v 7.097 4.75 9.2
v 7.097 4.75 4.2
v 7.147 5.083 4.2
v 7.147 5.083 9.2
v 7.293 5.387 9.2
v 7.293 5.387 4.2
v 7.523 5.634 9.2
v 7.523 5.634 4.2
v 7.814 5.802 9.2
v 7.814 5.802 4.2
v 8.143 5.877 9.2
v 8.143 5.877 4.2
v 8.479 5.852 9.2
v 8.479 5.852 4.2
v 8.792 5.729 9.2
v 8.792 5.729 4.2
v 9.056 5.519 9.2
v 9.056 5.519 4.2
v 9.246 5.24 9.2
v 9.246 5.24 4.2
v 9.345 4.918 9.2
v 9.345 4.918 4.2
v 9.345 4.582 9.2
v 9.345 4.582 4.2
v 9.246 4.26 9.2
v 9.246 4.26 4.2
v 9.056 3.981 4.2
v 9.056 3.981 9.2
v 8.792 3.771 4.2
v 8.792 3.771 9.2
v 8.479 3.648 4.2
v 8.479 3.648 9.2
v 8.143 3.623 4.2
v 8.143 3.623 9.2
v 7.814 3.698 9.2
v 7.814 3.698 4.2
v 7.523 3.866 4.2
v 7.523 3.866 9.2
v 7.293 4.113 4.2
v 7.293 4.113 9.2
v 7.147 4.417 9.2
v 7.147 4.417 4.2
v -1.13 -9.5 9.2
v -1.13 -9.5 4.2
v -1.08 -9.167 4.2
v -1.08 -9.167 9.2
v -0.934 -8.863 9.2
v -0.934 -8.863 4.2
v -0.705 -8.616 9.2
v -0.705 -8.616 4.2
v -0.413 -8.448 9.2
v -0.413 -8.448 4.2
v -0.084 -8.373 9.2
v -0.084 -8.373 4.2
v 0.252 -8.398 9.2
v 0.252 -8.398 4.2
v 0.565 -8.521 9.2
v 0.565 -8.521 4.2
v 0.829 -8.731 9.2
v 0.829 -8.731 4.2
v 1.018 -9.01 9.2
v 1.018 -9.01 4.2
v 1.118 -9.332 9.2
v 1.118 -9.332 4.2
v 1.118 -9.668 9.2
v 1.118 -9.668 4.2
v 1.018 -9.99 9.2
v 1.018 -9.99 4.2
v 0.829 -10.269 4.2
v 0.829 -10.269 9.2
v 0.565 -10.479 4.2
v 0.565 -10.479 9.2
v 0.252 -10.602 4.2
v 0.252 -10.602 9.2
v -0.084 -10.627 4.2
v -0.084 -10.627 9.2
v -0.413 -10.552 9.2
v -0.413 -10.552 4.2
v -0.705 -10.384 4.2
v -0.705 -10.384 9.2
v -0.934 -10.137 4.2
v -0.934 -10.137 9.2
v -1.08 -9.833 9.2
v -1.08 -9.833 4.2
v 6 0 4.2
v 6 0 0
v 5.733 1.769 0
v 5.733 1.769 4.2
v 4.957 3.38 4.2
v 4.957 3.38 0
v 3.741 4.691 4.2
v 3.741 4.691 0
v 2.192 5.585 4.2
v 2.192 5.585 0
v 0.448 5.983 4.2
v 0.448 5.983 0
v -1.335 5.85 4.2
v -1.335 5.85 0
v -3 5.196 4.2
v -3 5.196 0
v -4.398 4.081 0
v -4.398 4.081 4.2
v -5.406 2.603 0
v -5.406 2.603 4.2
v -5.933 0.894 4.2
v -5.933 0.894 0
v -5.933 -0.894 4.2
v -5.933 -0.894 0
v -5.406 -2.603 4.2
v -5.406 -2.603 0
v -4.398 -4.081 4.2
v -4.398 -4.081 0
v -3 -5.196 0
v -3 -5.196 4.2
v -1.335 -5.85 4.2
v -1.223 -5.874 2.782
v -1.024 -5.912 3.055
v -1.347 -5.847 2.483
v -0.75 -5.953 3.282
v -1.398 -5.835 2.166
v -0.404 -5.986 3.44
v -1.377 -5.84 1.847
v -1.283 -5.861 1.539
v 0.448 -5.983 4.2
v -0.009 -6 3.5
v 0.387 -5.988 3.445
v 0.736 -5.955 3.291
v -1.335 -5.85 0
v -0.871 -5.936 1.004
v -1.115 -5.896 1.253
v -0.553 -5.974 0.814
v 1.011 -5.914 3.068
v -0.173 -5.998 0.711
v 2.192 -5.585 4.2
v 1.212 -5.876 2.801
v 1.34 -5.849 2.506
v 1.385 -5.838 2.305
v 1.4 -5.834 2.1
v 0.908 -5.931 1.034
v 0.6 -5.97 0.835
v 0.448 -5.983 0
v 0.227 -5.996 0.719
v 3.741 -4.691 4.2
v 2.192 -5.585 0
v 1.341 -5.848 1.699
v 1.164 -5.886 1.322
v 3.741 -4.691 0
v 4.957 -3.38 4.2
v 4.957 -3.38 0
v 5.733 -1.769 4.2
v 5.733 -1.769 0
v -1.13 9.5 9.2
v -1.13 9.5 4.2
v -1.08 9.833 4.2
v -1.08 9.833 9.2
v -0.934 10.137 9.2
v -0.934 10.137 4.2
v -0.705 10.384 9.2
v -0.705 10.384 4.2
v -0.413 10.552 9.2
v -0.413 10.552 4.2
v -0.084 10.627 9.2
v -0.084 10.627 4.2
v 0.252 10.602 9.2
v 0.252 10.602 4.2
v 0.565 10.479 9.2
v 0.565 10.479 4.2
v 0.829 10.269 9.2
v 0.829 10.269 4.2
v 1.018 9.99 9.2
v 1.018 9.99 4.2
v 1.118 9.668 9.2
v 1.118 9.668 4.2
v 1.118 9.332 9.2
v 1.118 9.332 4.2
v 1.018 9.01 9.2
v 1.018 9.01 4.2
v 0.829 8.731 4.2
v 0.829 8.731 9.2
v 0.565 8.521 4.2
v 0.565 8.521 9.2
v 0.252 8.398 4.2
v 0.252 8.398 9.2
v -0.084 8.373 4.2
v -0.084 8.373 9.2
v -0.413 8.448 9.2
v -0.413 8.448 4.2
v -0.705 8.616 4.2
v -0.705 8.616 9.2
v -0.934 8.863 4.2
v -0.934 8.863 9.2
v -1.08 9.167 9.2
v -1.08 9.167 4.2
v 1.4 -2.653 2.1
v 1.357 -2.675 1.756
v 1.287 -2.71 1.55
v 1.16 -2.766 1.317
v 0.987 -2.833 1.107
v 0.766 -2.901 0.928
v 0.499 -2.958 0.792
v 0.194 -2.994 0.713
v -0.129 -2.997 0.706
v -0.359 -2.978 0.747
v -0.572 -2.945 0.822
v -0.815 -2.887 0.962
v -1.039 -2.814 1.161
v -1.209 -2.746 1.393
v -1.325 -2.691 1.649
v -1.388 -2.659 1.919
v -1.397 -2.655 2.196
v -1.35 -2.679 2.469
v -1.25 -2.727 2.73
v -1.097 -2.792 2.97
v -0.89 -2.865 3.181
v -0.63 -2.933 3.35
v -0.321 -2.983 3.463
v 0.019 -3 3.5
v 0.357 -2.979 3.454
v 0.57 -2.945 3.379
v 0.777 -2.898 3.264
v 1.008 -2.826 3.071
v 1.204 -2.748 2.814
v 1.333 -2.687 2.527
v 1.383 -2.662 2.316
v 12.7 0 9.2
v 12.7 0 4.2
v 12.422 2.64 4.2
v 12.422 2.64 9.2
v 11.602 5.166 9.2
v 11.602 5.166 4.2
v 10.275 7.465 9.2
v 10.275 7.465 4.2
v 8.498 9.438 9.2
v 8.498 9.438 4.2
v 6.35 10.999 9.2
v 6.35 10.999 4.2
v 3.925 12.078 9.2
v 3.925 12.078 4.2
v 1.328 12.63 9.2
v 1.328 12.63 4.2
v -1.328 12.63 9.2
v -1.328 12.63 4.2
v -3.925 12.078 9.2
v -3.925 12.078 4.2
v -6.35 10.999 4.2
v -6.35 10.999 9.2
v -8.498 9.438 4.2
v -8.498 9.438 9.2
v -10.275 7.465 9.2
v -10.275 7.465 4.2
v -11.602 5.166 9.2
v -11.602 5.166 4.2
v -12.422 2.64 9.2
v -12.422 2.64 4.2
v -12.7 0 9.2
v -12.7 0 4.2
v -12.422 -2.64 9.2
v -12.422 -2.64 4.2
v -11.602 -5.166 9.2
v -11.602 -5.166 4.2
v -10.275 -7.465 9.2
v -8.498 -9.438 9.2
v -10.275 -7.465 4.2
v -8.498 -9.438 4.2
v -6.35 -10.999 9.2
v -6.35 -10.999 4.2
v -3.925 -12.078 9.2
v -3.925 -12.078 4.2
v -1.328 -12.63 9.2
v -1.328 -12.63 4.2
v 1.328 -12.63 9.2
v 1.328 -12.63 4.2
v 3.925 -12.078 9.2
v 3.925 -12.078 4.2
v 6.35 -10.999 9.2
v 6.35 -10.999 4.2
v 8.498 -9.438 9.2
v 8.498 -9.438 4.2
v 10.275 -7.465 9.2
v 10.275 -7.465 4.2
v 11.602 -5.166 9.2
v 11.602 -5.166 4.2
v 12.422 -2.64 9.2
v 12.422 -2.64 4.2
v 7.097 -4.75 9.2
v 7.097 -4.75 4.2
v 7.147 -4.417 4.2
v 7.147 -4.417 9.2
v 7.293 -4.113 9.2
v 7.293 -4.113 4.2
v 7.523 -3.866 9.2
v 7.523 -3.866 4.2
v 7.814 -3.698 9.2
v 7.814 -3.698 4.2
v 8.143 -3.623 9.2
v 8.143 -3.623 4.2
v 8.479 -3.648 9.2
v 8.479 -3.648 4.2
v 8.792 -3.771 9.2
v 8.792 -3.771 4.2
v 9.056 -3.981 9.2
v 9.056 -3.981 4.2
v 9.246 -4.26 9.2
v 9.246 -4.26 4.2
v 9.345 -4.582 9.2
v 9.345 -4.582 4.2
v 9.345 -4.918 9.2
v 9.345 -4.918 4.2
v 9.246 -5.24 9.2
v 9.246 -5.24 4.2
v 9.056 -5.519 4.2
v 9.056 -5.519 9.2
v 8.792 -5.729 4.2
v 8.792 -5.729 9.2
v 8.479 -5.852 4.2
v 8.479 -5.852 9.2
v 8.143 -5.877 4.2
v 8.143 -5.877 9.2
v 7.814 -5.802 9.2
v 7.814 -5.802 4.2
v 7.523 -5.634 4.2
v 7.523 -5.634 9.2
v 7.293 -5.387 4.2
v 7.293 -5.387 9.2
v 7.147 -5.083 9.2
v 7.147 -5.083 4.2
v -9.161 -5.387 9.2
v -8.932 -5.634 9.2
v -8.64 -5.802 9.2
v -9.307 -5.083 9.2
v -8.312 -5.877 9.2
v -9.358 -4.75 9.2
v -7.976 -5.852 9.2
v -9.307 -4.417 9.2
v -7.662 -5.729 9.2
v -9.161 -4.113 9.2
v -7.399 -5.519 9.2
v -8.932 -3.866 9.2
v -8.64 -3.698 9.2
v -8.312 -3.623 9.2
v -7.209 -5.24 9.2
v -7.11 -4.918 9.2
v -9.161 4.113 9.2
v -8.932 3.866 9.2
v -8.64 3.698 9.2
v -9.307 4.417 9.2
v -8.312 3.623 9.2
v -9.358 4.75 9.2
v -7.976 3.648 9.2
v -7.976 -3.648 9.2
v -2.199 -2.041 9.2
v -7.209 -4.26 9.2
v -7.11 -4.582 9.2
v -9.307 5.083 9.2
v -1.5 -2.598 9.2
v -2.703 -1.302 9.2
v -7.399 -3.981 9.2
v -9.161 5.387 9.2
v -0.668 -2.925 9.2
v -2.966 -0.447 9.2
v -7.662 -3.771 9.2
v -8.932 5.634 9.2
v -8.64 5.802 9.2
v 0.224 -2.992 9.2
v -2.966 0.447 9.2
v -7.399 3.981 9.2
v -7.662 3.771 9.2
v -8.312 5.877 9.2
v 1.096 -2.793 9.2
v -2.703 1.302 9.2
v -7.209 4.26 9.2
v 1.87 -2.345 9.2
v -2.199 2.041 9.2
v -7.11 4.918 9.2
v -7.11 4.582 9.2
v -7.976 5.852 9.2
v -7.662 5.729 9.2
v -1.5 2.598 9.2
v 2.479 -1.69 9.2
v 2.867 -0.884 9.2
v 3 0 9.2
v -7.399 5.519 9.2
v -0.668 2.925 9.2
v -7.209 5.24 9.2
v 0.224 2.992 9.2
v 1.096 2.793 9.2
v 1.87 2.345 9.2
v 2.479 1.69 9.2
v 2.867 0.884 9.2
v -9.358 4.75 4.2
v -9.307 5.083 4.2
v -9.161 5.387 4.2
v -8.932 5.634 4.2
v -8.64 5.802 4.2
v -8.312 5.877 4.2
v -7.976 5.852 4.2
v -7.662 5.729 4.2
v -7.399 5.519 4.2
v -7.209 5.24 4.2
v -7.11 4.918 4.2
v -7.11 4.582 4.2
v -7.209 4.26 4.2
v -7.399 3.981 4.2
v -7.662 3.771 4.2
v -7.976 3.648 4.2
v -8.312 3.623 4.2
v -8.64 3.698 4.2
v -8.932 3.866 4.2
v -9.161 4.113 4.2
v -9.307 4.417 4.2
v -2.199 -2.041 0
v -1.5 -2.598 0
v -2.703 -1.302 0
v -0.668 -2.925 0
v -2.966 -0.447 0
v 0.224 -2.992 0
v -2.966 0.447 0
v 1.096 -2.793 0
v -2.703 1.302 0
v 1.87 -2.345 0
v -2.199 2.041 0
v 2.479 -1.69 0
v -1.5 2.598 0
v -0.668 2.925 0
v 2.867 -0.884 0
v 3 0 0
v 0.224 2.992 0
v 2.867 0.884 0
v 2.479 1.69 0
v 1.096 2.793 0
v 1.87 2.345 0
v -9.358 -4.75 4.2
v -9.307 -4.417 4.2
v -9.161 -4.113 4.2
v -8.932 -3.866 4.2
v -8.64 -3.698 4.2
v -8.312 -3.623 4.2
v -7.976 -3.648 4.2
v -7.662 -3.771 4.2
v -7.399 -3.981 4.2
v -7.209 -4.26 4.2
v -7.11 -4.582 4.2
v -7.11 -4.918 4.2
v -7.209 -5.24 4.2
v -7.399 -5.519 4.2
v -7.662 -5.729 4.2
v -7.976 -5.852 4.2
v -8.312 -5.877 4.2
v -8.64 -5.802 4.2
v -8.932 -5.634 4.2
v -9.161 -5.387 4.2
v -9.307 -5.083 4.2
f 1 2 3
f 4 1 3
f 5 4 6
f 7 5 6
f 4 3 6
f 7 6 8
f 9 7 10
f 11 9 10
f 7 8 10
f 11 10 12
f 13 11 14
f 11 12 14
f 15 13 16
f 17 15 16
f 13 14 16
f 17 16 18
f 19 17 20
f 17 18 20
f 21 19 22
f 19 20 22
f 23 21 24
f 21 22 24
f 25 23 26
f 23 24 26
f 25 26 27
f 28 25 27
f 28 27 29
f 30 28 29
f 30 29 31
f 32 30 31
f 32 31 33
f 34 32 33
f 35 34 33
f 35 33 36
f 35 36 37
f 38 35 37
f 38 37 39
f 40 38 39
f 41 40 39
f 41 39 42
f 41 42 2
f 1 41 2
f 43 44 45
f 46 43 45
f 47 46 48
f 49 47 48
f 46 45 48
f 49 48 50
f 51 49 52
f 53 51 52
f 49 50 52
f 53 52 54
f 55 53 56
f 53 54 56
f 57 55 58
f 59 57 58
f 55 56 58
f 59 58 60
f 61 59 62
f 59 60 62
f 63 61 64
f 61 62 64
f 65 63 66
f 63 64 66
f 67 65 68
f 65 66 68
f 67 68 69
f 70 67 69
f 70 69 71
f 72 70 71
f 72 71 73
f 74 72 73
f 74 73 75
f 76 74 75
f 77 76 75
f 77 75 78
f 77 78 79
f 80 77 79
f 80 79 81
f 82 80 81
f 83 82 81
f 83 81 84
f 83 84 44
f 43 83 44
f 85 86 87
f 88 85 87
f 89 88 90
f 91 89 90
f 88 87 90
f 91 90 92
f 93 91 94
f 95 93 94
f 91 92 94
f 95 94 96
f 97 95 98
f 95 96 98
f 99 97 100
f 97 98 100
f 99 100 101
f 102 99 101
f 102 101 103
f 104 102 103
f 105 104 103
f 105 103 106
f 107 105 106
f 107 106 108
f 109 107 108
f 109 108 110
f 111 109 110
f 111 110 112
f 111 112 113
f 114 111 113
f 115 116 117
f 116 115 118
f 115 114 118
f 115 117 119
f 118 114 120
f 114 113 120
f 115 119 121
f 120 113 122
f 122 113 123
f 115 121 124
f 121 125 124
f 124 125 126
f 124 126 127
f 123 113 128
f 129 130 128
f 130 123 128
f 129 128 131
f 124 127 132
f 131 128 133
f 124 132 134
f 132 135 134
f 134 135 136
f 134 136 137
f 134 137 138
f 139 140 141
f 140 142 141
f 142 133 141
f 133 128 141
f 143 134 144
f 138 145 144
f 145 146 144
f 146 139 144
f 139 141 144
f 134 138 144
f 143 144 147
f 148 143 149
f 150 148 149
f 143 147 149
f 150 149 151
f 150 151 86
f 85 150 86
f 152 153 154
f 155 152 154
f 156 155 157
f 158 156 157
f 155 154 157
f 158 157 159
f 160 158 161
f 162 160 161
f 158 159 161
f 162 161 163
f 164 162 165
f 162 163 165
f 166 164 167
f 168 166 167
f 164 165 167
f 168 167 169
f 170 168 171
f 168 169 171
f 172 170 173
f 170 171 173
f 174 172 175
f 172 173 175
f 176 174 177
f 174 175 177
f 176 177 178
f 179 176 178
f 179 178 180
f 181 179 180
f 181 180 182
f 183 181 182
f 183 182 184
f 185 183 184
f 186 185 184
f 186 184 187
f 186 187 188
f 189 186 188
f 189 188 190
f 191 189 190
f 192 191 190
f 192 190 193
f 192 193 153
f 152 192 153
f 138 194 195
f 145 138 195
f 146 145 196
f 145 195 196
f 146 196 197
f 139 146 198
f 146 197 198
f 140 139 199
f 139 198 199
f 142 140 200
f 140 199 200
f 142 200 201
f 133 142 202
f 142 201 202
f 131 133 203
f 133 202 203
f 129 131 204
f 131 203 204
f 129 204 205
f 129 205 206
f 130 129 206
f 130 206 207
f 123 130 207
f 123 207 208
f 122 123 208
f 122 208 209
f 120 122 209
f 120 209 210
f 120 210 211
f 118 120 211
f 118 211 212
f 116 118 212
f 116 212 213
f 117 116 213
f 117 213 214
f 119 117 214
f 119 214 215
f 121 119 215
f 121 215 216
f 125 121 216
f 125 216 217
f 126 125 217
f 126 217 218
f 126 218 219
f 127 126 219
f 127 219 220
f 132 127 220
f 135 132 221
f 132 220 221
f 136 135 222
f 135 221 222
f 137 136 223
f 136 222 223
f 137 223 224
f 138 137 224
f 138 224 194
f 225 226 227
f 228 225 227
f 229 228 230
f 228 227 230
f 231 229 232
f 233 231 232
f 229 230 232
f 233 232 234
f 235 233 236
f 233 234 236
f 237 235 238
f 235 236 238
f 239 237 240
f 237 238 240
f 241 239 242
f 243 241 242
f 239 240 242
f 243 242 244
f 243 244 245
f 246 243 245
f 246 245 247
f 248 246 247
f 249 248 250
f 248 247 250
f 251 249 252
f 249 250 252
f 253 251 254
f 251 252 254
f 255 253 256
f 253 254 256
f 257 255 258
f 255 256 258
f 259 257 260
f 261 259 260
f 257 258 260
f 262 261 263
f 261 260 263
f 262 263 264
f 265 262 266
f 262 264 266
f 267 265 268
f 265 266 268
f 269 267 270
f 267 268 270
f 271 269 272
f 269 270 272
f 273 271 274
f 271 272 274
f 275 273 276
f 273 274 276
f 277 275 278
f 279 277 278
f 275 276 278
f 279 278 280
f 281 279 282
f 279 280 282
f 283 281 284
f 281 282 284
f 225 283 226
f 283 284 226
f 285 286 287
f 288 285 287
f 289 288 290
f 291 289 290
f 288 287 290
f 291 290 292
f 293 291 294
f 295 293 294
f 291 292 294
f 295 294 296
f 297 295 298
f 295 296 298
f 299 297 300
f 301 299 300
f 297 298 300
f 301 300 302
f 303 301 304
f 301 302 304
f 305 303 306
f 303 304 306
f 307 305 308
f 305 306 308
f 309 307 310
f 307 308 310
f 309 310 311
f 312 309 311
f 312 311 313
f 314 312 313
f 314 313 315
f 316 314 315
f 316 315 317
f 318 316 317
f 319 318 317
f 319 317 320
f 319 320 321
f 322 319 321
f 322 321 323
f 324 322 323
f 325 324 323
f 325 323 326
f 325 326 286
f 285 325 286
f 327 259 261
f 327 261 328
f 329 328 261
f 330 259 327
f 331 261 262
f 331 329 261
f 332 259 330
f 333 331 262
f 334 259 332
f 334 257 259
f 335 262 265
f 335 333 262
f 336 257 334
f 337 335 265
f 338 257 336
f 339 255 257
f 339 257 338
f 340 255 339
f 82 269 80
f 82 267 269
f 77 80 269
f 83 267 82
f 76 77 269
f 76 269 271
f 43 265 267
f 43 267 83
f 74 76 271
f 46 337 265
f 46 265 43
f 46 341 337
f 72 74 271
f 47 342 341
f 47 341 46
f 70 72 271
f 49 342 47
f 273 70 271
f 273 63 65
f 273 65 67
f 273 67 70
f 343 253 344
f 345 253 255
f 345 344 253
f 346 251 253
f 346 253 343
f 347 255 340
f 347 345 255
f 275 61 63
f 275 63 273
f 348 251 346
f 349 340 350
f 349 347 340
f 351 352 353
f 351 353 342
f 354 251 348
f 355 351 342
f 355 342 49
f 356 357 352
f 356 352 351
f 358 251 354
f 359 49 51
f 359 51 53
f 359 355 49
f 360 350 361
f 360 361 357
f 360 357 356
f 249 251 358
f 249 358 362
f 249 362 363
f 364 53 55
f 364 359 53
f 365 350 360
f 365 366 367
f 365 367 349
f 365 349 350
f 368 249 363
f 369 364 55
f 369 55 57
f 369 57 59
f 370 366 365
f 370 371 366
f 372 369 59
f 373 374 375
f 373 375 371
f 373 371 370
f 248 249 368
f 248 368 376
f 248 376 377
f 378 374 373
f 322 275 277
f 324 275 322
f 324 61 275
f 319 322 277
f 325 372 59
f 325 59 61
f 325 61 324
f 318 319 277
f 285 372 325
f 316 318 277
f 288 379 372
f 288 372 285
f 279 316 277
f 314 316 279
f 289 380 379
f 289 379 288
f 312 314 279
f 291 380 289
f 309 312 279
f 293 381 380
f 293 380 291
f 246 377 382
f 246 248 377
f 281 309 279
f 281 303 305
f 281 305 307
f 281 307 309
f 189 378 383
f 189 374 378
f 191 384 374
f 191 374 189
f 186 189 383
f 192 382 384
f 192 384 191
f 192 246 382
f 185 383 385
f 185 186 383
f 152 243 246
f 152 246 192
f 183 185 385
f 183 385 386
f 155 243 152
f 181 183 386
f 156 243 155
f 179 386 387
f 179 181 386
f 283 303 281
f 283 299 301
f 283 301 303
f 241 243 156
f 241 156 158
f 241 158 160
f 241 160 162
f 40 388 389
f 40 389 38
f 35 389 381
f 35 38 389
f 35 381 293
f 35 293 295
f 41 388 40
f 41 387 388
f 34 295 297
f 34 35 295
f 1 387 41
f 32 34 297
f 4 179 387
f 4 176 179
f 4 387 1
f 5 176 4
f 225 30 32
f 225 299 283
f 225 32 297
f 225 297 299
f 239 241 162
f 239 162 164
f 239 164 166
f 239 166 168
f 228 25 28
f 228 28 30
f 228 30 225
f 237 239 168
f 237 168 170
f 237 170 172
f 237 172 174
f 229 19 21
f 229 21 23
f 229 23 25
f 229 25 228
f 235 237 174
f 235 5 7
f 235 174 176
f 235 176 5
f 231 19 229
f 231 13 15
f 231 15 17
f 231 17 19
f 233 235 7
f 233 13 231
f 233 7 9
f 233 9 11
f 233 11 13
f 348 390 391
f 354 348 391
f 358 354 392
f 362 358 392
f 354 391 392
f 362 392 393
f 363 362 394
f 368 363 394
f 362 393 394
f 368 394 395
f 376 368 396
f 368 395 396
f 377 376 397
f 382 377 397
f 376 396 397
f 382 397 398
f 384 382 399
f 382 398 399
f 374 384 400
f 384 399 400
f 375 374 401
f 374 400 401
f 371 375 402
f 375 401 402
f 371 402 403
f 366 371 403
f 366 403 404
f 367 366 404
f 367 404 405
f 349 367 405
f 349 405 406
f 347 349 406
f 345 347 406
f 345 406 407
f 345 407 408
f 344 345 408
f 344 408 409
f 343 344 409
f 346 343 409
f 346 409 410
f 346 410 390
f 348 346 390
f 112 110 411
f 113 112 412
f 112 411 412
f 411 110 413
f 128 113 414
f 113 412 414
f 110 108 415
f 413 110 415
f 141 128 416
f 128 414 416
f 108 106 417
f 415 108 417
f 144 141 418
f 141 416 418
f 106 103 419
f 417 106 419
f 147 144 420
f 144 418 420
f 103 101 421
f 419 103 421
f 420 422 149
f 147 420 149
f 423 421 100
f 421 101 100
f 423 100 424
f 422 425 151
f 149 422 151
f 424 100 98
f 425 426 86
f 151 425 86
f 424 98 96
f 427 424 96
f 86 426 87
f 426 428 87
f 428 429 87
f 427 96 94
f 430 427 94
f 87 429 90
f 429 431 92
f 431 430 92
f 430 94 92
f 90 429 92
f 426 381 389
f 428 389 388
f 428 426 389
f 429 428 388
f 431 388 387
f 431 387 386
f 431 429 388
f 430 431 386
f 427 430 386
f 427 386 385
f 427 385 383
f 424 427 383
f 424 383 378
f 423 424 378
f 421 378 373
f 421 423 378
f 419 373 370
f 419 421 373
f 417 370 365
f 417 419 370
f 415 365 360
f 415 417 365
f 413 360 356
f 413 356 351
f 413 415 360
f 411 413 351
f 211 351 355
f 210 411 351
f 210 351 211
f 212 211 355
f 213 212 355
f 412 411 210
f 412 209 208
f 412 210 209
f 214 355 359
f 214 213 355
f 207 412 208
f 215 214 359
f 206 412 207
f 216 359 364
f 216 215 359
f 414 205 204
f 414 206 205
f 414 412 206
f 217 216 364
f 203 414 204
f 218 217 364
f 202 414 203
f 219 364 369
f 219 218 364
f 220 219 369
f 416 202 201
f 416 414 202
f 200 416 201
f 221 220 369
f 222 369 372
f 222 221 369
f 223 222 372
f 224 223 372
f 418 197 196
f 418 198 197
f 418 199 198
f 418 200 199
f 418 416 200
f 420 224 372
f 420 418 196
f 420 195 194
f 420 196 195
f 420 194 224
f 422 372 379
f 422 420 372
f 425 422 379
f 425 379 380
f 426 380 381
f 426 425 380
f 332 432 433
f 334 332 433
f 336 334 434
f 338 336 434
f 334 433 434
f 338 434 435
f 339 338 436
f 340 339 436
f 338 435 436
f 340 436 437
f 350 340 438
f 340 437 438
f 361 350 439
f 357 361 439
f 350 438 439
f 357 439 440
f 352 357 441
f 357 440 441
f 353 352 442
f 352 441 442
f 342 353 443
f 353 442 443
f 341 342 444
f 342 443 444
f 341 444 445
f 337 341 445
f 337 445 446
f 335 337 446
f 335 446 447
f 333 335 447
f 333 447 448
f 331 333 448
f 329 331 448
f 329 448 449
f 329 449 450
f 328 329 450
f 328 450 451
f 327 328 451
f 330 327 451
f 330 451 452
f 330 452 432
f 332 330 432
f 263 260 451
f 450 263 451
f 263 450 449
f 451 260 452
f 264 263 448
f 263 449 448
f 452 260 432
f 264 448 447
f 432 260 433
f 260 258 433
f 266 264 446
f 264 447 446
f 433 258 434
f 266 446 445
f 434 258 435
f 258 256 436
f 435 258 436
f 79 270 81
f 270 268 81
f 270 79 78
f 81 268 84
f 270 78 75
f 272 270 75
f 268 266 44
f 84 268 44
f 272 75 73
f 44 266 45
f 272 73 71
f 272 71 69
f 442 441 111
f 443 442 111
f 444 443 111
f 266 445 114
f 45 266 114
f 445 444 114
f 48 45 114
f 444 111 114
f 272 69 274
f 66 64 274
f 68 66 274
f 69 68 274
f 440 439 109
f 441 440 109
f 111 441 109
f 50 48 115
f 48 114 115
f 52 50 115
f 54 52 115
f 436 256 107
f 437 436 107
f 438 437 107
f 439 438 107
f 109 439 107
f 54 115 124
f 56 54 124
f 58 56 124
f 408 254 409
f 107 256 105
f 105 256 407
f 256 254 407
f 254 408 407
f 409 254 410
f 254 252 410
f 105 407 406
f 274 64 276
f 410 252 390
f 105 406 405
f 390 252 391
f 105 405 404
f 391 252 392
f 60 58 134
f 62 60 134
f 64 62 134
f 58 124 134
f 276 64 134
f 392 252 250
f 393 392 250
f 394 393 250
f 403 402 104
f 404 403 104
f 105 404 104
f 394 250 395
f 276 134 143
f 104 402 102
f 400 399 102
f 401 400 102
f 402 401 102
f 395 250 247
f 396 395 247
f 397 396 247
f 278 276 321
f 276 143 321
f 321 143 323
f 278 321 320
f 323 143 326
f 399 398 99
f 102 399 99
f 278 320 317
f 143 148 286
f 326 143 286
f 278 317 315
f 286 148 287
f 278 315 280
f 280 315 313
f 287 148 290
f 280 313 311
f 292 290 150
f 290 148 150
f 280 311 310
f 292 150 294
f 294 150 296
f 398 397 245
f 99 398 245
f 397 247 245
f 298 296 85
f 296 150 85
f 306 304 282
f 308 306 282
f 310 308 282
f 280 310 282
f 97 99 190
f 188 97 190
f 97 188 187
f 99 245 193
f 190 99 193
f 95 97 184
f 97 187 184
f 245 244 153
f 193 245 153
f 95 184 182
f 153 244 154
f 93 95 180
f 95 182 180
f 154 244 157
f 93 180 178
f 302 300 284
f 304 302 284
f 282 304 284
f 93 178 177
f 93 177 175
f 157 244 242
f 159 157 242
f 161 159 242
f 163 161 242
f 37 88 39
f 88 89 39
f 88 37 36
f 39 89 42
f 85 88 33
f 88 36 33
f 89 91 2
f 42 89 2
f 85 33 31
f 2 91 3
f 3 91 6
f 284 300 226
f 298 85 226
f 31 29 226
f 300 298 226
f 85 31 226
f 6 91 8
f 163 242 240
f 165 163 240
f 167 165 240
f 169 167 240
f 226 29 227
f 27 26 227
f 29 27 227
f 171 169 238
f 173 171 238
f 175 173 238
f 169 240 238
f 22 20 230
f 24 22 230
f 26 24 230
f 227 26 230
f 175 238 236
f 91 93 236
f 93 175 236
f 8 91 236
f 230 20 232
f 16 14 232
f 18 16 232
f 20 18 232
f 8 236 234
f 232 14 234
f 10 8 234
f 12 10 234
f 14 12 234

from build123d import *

# Parameters (mm, degrees)
SKETCH1_R                 = 6
SKETCH1_R_2               = 3
BOSS_EXTRUDE1_DEPTH       = 4.2
SKETCH2_R                 = 12.7
SKETCH2_R_2               = 3
BOSS_EXTRUDE2_DEPTH       = 5
SKETCH3_R                 = 1.4
CUT_EXTRUDE1_DEPTH        = 13.7
F_4_40_TAPPED_HOLE1_D     = 2.2606
F_4_40_TAPPED_HOLE1_DEPTH = 7.6
F_4_40_TAPPED_HOLE1_TIP   = 0.679152758


with BuildPart() as part:
    # Sketch1 → Boss-Extrude1 (new body)
    with BuildSketch(Plane.XY):
        Circle(SKETCH1_R)
        Circle(SKETCH1_R_2, mode=Mode.SUBTRACT)
    extrude(amount=BOSS_EXTRUDE1_DEPTH)

    # Sketch2 → Boss-Extrude2 (add)
    with BuildSketch(Plane.XY.offset(4.2)):
        Circle(SKETCH2_R)
        Circle(SKETCH2_R_2, mode=Mode.SUBTRACT)
    extrude(amount=BOSS_EXTRUDE2_DEPTH)

    # Sketch3 → Cut-Extrude1 (cut, through all)
    with BuildSketch(Plane(origin=(0, 0, 0), x_dir=(1, 0, 0), z_dir=(0, 1, 0))):
        with Locations((0, -2.1)):
            Circle(SKETCH3_R)
    extrude(amount=-CUT_EXTRUDE1_DEPTH, mode=Mode.SUBTRACT)

    # #4-40 Tapped Hole1
    with Locations(Plane.XY.offset(9.2)):
        with Locations((-8.227241336, -4.75), (-8.227241336, 4.75), (0, 9.5), (8.227241336, 4.75), (8.227241336, -4.75), (0, -9.5)):
            Hole(F_4_40_TAPPED_HOLE1_D / 2, depth=F_4_40_TAPPED_HOLE1_DEPTH)
            with Locations((0, 0, -(F_4_40_TAPPED_HOLE1_DEPTH + F_4_40_TAPPED_HOLE1_TIP / 2))):  # 118° drill point
                Cone(0, F_4_40_TAPPED_HOLE1_D / 2, F_4_40_TAPPED_HOLE1_TIP, mode=Mode.SUBTRACT)


solid = part.part
